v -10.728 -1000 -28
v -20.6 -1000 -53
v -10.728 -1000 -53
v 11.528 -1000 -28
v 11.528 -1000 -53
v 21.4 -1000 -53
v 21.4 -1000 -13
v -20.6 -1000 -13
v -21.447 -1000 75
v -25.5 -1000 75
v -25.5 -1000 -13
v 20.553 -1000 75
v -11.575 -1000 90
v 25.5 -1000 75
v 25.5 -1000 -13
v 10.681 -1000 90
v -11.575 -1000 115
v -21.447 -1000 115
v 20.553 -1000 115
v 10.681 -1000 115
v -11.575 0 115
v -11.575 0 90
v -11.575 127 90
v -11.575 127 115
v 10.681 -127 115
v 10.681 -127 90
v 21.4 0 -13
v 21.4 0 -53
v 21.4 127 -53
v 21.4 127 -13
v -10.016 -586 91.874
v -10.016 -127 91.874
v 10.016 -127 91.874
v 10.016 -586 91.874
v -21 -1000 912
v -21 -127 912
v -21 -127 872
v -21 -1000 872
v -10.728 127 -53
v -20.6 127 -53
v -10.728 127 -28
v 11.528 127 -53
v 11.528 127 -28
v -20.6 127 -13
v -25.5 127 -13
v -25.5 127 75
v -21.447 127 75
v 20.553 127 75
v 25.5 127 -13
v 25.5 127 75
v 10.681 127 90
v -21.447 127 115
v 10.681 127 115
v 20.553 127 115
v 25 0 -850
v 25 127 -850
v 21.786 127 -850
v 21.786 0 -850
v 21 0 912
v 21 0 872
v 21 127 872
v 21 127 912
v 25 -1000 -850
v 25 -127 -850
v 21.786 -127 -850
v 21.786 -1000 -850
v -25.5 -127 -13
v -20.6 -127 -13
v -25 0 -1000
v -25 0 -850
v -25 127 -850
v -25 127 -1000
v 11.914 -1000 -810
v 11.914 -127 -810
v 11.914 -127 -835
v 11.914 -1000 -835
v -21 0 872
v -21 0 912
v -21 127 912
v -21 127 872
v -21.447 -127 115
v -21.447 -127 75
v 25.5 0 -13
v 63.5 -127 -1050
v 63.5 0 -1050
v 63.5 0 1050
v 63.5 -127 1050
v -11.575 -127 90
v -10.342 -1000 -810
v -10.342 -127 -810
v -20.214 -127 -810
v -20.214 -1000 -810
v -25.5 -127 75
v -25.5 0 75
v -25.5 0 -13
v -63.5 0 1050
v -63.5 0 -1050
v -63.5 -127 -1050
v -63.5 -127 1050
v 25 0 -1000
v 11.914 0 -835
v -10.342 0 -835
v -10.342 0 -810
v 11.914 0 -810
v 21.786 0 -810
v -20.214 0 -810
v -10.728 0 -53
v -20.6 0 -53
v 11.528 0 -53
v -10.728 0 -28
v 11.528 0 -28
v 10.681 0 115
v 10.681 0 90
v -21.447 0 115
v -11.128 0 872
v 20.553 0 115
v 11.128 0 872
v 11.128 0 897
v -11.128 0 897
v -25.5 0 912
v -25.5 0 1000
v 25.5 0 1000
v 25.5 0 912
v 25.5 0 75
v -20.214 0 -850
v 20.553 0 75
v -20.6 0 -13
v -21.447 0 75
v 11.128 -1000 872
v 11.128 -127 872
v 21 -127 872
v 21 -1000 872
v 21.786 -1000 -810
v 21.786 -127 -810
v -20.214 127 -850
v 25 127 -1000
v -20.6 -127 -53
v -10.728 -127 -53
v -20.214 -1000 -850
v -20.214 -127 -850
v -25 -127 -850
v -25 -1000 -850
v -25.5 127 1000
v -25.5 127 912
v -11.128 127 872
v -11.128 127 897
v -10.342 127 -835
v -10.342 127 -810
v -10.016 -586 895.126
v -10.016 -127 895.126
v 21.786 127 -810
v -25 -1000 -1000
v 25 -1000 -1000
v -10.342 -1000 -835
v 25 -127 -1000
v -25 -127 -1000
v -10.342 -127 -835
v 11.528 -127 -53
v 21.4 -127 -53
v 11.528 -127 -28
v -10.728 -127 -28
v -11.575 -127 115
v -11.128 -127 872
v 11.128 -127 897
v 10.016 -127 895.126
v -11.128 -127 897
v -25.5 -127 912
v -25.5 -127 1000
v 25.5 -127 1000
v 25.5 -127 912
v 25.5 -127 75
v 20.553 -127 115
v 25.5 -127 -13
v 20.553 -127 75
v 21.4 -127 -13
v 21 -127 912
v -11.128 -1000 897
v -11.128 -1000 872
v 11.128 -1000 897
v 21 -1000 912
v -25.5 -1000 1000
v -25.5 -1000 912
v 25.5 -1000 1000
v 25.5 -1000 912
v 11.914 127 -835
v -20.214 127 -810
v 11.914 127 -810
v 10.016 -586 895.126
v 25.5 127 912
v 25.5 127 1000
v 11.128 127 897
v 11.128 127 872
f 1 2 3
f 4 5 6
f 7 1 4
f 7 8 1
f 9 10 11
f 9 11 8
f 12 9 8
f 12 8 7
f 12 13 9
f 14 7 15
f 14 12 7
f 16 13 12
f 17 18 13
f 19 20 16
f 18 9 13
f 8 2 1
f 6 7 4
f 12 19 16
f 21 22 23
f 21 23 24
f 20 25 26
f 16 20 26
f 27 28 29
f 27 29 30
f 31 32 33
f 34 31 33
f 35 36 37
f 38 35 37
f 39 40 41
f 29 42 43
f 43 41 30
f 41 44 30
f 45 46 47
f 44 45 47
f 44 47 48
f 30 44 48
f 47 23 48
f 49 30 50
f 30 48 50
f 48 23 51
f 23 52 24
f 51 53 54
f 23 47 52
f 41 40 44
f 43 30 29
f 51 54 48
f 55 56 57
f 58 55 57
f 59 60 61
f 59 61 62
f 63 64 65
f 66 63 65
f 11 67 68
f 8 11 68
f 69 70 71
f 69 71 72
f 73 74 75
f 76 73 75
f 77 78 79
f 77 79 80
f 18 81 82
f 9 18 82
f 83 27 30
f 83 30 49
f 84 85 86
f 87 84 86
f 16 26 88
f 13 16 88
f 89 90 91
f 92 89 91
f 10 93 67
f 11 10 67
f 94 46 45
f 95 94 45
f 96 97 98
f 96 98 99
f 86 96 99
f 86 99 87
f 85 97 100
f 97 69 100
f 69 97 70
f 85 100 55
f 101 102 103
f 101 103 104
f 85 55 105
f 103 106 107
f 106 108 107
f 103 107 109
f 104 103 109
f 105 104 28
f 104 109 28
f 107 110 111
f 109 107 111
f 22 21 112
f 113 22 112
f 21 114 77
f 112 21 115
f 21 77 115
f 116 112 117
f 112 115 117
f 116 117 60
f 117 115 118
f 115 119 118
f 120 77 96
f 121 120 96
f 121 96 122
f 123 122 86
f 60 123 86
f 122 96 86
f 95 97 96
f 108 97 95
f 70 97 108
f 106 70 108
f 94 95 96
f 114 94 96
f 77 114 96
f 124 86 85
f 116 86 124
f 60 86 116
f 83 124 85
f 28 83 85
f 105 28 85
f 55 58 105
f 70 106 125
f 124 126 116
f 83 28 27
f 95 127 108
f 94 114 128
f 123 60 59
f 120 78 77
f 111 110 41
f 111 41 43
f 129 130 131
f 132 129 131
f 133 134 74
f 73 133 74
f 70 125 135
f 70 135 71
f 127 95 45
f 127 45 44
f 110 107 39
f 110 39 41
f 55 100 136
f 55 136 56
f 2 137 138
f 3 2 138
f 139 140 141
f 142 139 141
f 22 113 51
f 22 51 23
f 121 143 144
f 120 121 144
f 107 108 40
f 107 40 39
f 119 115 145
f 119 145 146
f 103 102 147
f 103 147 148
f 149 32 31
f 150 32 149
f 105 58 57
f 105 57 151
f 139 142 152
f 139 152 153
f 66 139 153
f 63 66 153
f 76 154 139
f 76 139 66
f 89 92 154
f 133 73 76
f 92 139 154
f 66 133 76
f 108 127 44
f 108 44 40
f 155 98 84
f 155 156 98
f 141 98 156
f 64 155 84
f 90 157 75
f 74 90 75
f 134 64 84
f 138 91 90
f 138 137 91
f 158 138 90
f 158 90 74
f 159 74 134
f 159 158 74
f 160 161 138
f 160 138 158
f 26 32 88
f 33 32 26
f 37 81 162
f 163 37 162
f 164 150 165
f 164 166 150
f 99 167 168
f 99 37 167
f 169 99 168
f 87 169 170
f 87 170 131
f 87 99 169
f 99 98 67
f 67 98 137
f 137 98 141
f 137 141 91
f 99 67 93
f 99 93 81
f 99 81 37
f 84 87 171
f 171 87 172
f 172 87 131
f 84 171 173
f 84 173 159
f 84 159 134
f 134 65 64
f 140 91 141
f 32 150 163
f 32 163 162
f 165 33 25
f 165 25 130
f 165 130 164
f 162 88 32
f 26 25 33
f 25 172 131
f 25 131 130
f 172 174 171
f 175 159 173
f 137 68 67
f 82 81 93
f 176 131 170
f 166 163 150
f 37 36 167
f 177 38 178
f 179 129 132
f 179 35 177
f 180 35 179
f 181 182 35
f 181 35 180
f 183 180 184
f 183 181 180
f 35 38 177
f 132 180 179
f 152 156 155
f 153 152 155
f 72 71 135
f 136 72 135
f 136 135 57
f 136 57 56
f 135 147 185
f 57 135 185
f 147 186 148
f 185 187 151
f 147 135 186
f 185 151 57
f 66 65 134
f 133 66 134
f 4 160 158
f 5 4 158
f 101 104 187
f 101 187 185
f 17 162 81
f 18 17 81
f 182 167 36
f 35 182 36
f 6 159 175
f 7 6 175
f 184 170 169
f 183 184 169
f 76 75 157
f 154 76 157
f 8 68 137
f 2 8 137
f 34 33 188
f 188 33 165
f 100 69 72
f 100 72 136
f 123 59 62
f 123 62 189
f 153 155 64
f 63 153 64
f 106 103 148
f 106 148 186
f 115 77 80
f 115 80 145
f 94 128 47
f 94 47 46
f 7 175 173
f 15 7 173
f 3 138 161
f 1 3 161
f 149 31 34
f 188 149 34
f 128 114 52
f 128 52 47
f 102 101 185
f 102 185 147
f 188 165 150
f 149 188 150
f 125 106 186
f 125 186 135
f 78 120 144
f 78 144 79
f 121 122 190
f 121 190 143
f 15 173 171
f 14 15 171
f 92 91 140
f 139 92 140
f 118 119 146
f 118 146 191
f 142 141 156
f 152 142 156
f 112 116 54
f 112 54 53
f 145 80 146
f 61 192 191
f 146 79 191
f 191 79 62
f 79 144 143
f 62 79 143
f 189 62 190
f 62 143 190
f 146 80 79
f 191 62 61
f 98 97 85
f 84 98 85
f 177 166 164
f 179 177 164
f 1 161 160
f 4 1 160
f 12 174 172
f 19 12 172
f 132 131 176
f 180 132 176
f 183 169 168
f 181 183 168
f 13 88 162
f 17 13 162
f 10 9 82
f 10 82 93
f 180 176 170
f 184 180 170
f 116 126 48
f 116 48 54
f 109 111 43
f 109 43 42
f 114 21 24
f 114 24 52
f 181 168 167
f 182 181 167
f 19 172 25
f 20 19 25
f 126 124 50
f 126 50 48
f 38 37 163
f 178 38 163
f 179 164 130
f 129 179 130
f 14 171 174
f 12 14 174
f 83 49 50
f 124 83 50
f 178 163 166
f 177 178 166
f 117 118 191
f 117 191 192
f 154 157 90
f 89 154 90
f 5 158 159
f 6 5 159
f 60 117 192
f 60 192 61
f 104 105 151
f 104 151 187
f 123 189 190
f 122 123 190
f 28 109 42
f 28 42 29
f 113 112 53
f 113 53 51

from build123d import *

# Parameters (mm, degrees)
F0_W          = 127
F0_H          = 2100
F1_DEPTH      = 127
F2_DEPTH      = 127
F2_DEPTH_BACK = 1000
F0_W_2        = 10.0161342862
F0_H_2        = 803.2517696619
F3_DEPTH      = 586


with BuildPart() as f1:
    # F0 (on Front) → F1 (new body)
    with BuildSketch(Plane.XZ):
        Rectangle(F0_W, F0_H)
        Polygon((-10.3423068728, -835), (0.7857291494, -835), (11.9137651715, -835), (11.9137651715, -810), (21.7857291494, -810), (21.7857291494, -850), (25, -850), (25, -1000), (-25, -1000), (-25, -850), (-20.2142708506, -850), (-20.2142708506, -810), (-10.3423068728, -810), align=None, mode=Mode.SUBTRACT)
        Polygon((-10.0161342919, 895.125884831), (-2.774e-07, 895.125884831), (10.0161340088, 895.125884831), (10.0161340088, 91.874115169), (-5.7e-09, 91.874115169), (-10.0161342919, 91.874115169), align=None, mode=Mode.SUBTRACT)
        Polygon((-11.5747122988, 90), (-5.1e-09, 90), (10.6813597456, 90), (10.6813597456, 115), (20.5533237234, 115), (20.5533237234, 75), (25.5, 75), (25.5, -13), (21.3999971747, -13), (21.3999971747, -53), (11.5280331969, -53), (11.5280331969, -28), (0.7857291494, -28), (-10.7280388474, -28), (-10.7280388474, -53), (-20.6000028253, -53), (-20.6000028253, -13), (-25.5, -13), (-25.5, 75), (-21.4466762766, 75), (-21.4466762766, 115), (-11.5747122988, 115), align=None, mode=Mode.SUBTRACT)
        Polygon((25.5, 1000), (25.5, 912), (20.9999997169, 912), (20.9999997169, 872), (11.1280357391, 872), (11.1280357391, 897), (-2.78e-07, 897), (-11.1280363053, 897), (-11.1280363053, 872), (-21.0000002831, 872), (-21.0000002831, 912), (-25.5, 912), (-25.5, 1000), align=None, mode=Mode.SUBTRACT)
        Polygon((20.9999997169, 872), (20.9999997169, 912), (-2.831e-07, 912), (-2.78e-07, 897), (11.1280357391, 897), (11.1280357391, 872), align=None)
        Polygon((-2.78e-07, 897), (-2.831e-07, 912), (-21.0000002831, 912), (-21.0000002831, 872), (-11.1280363053, 872), (-11.1280363053, 897), align=None)
        Polygon((21.3999971747, -53), (21.3999971747, -13), (0.7857291494, -13), (0.7857291494, -28), (11.5280331969, -28), (11.5280331969, -53), align=None)
        Polygon((0.7857291494, -13), (-20.6000028253, -13), (-20.6000028253, -53), (-10.7280388474, -53), (-10.7280388474, -28), (0.7857291494, -28), align=None)
    extrude(amount=F1_DEPTH)

    # F0 (on Front) → F2 (join, two sides)
    with BuildSketch(Plane.XZ) as f2_sk:
        Polygon((11.9137651715, -835), (0.7857291494, -835), (0.7857291494, -850), (21.7857291494, -850), (21.7857291494, -810), (11.9137651715, -810), align=None)
        Polygon((0.7857291494, -850), (0.7857291494, -835), (-10.3423068728, -835), (-10.3423068728, -810), (-20.2142708506, -810), (-20.2142708506, -850), align=None)
        Polygon((10.6813597456, 90), (-5.1e-09, 90), (0, 75), (20.5533237234, 75), (20.5533237234, 115), (10.6813597456, 115), align=None)
        Polygon((0, 75), (-5.1e-09, 90), (-11.5747122988, 90), (-11.5747122988, 115), (-21.4466762766, 115), (-21.4466762766, 75), align=None)
        Polygon((20.9999997169, 912), (25.5, 912), (25.5, 1000), (-25.5, 1000), (-25.5, 912), (-21.0000002831, 912), (-2.831e-07, 912), align=None)
        Polygon((20.9999997169, 872), (20.9999997169, 912), (-2.831e-07, 912), (-2.78e-07, 897), (11.1280357391, 897), (11.1280357391, 872), align=None)
        Polygon((-2.78e-07, 897), (-2.831e-07, 912), (-21.0000002831, 912), (-21.0000002831, 872), (-11.1280363053, 872), (-11.1280363053, 897), align=None)
        Polygon((20.5533237234, 75), (0, 75), (-21.4466762766, 75), (-25.5, 75), (-25.5, -13), (-20.6000028253, -13), (0.7857291494, -13), (21.3999971747, -13), (25.5, -13), (25.5, 75), align=None)
        Polygon((21.3999971747, -53), (21.3999971747, -13), (0.7857291494, -13), (0.7857291494, -28), (11.5280331969, -28), (11.5280331969, -53), align=None)
        Polygon((0.7857291494, -13), (-20.6000028253, -13), (-20.6000028253, -53), (-10.7280388474, -53), (-10.7280388474, -28), (0.7857291494, -28), align=None)
        Polygon((21.7857291494, -850), (0.7857291494, -850), (-20.2142708506, -850), (-25, -850), (-25, -1000), (25, -1000), (25, -850), align=None)
    extrude(amount=-F2_DEPTH)
    extrude(f2_sk.sketch, amount=F2_DEPTH_BACK)

    # F0 (on Front) → F3 (join)
    with BuildSketch(Plane.XZ):
        with Locations((5.0080668657, 493.5)):
            Rectangle(F0_W_2, F0_H_2)
        with Locations((-5.0080671488, 493.5)):
            Rectangle(F0_W_2, F0_H_2)
    extrude(amount=F3_DEPTH)


solid = f1.part
